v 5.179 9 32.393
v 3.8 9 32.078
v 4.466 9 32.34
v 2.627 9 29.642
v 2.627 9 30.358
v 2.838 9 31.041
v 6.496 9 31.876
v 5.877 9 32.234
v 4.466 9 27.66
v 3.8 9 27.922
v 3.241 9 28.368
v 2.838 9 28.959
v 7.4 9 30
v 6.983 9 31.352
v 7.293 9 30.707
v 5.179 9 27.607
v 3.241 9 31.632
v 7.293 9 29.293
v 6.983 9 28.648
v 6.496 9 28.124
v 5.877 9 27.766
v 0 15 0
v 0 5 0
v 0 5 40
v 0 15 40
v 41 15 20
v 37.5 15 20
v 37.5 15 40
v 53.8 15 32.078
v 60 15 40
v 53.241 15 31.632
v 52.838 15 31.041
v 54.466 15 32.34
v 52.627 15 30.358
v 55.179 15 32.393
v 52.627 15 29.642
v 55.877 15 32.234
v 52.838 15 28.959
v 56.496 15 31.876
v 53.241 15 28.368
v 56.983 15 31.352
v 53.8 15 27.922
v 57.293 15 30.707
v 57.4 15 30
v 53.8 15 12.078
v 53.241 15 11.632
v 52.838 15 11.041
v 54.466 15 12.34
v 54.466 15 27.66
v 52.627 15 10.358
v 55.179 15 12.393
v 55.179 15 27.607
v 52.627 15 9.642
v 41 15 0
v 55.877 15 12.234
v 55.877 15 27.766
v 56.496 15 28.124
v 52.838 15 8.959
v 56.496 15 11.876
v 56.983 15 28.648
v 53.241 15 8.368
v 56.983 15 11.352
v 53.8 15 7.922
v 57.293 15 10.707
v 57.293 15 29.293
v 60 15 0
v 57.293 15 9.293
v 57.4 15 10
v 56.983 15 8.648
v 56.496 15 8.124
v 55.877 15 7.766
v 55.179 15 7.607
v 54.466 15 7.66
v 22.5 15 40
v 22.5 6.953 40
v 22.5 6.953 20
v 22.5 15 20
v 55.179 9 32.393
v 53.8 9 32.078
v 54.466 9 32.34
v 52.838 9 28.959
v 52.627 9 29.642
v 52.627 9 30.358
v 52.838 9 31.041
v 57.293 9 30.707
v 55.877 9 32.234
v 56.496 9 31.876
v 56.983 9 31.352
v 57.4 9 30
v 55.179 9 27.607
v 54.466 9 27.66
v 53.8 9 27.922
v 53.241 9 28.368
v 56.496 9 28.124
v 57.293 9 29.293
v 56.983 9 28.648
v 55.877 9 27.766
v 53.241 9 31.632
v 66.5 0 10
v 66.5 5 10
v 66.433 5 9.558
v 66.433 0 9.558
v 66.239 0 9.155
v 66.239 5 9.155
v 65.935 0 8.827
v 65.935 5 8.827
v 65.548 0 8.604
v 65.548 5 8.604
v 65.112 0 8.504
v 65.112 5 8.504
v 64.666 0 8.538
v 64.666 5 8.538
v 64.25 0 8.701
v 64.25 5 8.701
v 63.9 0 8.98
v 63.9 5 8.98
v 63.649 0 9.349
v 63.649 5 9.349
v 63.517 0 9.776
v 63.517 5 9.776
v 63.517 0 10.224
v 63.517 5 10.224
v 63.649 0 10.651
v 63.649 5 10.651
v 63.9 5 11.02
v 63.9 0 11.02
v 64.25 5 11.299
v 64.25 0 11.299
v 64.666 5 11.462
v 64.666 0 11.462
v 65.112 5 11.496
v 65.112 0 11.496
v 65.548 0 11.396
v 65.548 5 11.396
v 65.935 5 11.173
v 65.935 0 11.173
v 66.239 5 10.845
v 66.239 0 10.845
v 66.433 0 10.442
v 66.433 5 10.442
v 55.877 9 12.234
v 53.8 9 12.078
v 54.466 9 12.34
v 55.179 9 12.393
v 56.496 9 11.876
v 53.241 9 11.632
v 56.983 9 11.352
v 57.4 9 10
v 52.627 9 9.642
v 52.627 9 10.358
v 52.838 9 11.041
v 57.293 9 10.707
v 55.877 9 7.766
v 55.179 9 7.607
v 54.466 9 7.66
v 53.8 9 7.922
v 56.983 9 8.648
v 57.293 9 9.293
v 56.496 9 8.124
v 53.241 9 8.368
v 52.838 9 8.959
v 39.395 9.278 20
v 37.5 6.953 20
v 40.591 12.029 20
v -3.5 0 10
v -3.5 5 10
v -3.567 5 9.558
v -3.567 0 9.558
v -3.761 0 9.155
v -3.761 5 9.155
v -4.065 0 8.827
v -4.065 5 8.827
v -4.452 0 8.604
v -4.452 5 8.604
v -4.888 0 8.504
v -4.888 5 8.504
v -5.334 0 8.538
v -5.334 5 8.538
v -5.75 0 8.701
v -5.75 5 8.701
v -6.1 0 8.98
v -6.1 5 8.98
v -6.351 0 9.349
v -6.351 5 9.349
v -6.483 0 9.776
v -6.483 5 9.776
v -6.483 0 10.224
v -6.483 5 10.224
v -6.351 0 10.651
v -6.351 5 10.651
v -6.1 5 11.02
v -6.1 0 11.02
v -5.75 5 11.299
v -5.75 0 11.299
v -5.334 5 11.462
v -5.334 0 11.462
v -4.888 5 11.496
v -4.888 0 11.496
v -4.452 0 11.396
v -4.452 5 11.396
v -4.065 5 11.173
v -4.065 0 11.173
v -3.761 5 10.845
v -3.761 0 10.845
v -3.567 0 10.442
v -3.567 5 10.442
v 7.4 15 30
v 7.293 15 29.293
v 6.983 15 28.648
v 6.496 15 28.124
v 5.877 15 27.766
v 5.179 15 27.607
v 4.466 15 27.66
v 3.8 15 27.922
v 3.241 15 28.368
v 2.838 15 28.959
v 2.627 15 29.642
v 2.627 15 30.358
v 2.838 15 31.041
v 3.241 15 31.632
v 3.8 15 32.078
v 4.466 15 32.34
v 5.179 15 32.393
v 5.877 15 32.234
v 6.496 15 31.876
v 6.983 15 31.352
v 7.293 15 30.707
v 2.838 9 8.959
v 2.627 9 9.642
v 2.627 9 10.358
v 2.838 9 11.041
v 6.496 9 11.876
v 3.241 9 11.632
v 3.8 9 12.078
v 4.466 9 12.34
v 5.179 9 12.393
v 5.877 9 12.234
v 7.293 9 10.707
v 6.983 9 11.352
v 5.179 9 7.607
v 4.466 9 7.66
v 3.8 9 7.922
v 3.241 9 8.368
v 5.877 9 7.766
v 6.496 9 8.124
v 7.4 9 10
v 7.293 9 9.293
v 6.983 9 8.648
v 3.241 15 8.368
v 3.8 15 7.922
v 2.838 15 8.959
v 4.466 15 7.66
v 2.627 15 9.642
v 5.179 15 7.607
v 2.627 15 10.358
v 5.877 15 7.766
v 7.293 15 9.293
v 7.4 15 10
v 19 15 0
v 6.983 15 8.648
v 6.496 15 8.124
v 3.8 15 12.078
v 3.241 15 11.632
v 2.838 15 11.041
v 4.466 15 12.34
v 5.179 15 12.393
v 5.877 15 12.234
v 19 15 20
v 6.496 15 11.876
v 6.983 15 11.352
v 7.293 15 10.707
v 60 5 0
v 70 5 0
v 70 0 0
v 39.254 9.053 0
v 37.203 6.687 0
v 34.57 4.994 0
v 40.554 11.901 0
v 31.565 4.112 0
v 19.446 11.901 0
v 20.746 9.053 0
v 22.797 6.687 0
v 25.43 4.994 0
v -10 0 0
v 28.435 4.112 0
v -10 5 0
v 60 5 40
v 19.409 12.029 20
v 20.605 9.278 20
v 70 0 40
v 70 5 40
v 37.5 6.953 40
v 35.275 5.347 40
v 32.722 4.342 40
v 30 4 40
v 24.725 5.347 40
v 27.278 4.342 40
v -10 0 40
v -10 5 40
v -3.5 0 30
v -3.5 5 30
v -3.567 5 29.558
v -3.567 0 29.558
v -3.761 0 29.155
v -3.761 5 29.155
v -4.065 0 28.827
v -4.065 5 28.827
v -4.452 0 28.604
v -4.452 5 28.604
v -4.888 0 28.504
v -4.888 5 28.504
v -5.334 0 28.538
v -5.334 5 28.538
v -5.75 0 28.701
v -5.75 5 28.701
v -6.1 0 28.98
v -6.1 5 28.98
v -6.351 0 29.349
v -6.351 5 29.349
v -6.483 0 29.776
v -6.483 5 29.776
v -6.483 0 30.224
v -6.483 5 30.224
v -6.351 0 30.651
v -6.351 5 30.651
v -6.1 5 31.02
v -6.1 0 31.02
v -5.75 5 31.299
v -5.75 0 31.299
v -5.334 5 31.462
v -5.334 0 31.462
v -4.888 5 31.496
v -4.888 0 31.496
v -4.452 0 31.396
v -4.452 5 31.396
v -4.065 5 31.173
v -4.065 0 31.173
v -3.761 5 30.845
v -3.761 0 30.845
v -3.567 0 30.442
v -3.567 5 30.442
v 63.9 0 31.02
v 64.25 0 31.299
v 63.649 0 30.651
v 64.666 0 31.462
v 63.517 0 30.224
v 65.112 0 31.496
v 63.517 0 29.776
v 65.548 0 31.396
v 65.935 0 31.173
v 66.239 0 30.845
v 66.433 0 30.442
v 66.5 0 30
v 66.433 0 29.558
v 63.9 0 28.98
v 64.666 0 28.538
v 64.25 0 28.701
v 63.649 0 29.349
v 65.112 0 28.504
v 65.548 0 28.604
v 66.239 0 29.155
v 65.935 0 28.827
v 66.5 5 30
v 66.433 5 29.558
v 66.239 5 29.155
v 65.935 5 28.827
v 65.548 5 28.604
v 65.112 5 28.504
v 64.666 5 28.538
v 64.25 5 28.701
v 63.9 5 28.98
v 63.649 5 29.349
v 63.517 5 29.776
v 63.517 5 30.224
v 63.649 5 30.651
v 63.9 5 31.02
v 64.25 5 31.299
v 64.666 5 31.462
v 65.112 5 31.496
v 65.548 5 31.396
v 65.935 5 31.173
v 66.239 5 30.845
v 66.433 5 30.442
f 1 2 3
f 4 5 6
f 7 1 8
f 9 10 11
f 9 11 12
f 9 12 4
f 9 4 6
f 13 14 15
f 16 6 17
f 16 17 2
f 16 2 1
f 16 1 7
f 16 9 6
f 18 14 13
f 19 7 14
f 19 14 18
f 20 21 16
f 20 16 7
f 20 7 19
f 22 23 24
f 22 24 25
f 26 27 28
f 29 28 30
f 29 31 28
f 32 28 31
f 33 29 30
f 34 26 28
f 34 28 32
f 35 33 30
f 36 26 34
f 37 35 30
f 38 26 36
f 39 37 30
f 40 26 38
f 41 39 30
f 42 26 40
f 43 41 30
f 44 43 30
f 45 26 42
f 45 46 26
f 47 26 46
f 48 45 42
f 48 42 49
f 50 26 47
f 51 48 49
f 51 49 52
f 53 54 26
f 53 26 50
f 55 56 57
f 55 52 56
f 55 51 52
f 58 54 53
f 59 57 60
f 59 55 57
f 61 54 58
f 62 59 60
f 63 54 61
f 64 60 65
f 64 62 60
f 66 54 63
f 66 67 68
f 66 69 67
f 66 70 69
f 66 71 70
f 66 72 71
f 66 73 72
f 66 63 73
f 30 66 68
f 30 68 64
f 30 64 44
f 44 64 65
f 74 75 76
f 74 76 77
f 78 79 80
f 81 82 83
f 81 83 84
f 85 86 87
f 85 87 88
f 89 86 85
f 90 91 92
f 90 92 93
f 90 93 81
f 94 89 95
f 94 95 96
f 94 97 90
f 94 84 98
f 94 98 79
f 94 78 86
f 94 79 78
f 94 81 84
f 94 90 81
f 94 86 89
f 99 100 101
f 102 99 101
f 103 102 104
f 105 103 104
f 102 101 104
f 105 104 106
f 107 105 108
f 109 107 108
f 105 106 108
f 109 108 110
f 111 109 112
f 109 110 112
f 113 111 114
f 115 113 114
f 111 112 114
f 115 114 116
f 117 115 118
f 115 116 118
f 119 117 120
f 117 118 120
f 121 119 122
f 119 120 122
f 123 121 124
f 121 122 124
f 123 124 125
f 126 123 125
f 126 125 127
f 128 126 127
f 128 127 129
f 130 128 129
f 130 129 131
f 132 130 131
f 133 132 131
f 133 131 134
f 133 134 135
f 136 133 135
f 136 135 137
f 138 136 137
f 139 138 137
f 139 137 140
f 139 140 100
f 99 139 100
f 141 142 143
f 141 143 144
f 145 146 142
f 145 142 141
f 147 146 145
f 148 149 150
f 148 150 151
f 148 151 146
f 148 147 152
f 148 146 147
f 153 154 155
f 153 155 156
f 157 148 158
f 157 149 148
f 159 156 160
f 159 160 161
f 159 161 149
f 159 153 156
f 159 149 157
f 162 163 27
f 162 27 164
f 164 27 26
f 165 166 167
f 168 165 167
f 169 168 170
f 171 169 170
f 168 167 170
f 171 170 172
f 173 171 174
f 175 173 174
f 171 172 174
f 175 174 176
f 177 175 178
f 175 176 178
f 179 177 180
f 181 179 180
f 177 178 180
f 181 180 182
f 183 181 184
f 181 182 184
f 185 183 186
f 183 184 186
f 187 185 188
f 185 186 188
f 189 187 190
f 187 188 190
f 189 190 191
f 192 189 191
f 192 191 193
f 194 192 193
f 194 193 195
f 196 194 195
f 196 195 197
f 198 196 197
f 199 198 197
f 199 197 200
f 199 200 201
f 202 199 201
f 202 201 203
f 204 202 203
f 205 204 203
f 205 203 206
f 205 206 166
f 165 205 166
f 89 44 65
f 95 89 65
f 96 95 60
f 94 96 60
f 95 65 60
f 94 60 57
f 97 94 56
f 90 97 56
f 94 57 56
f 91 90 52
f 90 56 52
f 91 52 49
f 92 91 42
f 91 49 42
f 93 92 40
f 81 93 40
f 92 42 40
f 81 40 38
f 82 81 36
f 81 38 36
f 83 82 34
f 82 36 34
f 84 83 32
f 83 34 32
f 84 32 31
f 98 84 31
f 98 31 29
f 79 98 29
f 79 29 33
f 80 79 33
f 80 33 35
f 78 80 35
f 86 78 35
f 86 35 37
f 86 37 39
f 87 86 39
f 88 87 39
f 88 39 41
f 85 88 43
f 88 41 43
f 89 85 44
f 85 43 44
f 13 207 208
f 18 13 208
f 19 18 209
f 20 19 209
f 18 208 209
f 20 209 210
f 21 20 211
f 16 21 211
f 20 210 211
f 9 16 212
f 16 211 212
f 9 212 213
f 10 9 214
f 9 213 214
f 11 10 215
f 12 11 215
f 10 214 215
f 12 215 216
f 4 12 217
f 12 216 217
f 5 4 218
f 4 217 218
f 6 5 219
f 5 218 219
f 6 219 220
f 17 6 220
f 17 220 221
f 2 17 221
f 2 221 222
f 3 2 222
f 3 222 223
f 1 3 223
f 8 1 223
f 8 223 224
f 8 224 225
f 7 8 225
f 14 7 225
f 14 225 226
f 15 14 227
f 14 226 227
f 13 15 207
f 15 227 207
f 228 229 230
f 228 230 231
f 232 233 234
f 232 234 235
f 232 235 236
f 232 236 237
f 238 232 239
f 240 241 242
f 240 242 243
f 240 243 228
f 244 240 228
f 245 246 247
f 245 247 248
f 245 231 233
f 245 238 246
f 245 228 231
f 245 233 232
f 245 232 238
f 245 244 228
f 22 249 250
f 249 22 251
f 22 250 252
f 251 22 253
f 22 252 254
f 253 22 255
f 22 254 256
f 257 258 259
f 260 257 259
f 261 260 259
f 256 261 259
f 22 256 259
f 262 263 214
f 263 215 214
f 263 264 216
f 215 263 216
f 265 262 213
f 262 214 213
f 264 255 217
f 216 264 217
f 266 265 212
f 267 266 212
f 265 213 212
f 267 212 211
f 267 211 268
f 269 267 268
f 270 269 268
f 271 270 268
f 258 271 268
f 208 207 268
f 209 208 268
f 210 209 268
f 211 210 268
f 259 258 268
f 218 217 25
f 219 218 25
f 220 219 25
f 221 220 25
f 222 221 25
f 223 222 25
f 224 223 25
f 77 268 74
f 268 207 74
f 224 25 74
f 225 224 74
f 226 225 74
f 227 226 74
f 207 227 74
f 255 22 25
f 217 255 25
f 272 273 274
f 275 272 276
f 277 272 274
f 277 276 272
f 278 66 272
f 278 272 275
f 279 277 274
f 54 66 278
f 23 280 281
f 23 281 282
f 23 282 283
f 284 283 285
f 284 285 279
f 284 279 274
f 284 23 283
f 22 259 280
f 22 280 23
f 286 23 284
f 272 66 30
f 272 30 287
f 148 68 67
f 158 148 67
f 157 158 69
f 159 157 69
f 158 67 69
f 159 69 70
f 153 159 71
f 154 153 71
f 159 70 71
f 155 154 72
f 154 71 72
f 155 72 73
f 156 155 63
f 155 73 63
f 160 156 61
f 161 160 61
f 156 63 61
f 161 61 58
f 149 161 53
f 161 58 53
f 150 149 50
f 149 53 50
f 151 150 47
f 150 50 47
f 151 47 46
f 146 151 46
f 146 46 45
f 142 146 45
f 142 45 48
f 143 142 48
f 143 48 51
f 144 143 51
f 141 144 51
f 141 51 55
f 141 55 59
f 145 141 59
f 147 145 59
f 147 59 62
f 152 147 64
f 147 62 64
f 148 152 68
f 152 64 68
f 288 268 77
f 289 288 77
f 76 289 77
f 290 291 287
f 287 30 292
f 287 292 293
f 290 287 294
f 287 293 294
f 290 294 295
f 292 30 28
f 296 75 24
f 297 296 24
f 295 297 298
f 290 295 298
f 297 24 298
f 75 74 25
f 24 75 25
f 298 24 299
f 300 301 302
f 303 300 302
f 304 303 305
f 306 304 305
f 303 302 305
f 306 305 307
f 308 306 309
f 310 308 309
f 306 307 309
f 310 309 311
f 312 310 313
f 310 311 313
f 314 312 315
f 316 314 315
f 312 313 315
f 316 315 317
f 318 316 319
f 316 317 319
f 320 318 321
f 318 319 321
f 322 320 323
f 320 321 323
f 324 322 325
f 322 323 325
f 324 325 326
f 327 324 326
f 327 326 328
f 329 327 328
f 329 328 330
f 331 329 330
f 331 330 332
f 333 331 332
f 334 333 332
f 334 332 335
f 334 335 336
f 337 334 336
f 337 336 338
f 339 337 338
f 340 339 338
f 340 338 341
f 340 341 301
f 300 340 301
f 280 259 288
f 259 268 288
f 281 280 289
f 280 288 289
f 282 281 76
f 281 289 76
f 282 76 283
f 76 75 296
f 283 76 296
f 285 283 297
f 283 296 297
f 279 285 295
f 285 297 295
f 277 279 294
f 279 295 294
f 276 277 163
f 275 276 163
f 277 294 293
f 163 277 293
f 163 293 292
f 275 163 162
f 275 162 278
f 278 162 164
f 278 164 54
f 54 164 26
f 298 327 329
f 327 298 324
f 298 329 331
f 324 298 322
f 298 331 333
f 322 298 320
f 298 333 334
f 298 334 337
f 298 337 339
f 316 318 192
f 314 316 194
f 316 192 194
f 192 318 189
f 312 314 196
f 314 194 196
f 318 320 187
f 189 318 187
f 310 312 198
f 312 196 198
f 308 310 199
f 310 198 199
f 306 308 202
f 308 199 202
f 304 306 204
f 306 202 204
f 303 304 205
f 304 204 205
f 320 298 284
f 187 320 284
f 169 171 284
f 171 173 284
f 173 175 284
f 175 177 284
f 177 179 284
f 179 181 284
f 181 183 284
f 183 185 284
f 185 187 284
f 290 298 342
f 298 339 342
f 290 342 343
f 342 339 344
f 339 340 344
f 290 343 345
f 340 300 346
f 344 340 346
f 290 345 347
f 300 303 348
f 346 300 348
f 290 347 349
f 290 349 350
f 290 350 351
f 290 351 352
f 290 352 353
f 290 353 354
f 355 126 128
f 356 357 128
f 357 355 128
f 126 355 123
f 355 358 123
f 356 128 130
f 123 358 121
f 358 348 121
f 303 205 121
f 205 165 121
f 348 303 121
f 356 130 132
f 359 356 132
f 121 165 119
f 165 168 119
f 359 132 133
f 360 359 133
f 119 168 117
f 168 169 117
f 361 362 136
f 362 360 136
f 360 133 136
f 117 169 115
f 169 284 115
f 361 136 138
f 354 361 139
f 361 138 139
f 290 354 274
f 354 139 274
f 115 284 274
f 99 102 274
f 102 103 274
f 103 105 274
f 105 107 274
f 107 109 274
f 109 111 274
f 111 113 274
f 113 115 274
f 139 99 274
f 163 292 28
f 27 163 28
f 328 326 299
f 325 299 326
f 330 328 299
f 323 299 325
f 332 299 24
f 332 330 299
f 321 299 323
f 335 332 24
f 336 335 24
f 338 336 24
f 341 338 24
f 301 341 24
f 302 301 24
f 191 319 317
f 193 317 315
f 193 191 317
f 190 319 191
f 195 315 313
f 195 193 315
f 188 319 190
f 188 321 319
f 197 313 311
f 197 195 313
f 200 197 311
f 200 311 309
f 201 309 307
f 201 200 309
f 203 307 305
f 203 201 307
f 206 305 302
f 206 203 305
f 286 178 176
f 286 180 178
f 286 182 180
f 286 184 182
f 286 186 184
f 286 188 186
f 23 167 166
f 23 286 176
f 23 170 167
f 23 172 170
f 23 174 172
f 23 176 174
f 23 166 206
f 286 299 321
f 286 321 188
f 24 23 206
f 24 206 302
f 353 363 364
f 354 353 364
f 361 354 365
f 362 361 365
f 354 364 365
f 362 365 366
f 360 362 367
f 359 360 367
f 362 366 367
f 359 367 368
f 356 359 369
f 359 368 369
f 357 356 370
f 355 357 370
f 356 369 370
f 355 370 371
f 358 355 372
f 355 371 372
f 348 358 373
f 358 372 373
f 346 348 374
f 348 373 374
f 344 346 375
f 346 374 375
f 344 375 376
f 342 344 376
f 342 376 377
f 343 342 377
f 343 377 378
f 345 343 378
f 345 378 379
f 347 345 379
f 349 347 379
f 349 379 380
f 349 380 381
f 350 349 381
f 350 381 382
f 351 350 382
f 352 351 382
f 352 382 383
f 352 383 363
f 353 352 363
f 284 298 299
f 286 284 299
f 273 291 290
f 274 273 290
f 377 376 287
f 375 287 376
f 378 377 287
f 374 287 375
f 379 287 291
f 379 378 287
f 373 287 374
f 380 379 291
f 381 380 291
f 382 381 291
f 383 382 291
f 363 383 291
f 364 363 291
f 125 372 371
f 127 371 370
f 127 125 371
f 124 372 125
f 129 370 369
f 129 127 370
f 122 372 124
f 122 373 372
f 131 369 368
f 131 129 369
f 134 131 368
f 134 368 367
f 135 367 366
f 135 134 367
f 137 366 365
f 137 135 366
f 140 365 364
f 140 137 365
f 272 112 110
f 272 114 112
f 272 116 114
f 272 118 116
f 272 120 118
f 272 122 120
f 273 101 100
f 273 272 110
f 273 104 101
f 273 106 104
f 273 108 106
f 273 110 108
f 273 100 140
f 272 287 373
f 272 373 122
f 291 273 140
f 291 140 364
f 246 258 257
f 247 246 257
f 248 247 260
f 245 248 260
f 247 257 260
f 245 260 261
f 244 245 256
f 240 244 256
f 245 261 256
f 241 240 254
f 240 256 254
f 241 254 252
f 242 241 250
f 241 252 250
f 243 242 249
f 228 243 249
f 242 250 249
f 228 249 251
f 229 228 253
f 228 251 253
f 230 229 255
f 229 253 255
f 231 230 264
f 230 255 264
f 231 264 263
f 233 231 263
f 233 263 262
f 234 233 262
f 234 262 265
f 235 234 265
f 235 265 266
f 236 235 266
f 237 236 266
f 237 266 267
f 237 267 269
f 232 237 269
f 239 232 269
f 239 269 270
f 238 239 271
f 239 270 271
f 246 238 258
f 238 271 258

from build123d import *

# Parameters (mm, degrees)
BASE_MORS_DEPTH                    = 40
ESQUISSE2_R                        = 11
EMPLACEMENT_MOTEUR_DEPTH           = 41
ESQUISSE3_R                        = 1.5
TROU_FIXATIONS_BASE_DEPTH          = 6
ESQUISSE4_R                        = 2.4
TROU_FIXATION_MORS_SUPERIEUR_DEPTH = 6
ESQUISSE6_W                        = 3.5
ESQUISSE6_H                        = 12
ENCOCHE_MOTEUR_DEPTH               = 20


with BuildPart() as part:
    # Esquisse1 → base_mors (new body)
    with BuildSketch(Plane.XY):
        Polygon((60, 15), (60, 5), (70, 5), (70, 0), (60, 0), (0, 0), (-10, 0), (-10, 5), (0, 5), (0, 15), align=None)
    extrude(amount=BASE_MORS_DEPTH)

    # Esquisse2 → emplacement_moteur (cut, through all)
    with BuildSketch(Plane.XY.offset(40)):
        with Locations((30, 15)):
            Circle(ESQUISSE2_R)
    extrude(amount=-EMPLACEMENT_MOTEUR_DEPTH, mode=Mode.SUBTRACT)

    # Esquisse3 → trou_fixations_base (cut, through all)
    with BuildSketch(Plane(origin=(0, 5, 0), x_dir=(1, 0, 0), z_dir=(0, 1, 0))):
        with Locations((-5, -10)):
            Circle(ESQUISSE3_R)
        with Locations((65, -10)):
            Circle(ESQUISSE3_R)
        with Locations((65, -30)):
            Circle(ESQUISSE3_R)
        with Locations((-5, -30)):
            Circle(ESQUISSE3_R)
    extrude(amount=-TROU_FIXATIONS_BASE_DEPTH, mode=Mode.SUBTRACT)

    # Esquisse4 → trou_fixation_mors_superieur (cut)
    with BuildSketch(Plane(origin=(0, 15, 0), x_dir=(1, 0, 0), z_dir=(0, 1, 0))):
        with Locations((5, -10)):
            Circle(ESQUISSE4_R)
        with Locations((55, -10)):
            Circle(ESQUISSE4_R)
        with Locations((55, -30)):
            Circle(ESQUISSE4_R)
        with Locations((5, -30)):
            Circle(ESQUISSE4_R)
    extrude(amount=-TROU_FIXATION_MORS_SUPERIEUR_DEPTH, mode=Mode.SUBTRACT)

    # Esquisse6 → encoche moteur (add)
    with BuildSketch(Plane.XY.offset(40)):
        with Locations((20.75, 9)):
            Rectangle(ESQUISSE6_W, ESQUISSE6_H)
        with Locations((39.25, 9)):
            Rectangle(ESQUISSE6_W, ESQUISSE6_H)
    extrude(amount=-ENCOCHE_MOTEUR_DEPTH)


solid = part.part
